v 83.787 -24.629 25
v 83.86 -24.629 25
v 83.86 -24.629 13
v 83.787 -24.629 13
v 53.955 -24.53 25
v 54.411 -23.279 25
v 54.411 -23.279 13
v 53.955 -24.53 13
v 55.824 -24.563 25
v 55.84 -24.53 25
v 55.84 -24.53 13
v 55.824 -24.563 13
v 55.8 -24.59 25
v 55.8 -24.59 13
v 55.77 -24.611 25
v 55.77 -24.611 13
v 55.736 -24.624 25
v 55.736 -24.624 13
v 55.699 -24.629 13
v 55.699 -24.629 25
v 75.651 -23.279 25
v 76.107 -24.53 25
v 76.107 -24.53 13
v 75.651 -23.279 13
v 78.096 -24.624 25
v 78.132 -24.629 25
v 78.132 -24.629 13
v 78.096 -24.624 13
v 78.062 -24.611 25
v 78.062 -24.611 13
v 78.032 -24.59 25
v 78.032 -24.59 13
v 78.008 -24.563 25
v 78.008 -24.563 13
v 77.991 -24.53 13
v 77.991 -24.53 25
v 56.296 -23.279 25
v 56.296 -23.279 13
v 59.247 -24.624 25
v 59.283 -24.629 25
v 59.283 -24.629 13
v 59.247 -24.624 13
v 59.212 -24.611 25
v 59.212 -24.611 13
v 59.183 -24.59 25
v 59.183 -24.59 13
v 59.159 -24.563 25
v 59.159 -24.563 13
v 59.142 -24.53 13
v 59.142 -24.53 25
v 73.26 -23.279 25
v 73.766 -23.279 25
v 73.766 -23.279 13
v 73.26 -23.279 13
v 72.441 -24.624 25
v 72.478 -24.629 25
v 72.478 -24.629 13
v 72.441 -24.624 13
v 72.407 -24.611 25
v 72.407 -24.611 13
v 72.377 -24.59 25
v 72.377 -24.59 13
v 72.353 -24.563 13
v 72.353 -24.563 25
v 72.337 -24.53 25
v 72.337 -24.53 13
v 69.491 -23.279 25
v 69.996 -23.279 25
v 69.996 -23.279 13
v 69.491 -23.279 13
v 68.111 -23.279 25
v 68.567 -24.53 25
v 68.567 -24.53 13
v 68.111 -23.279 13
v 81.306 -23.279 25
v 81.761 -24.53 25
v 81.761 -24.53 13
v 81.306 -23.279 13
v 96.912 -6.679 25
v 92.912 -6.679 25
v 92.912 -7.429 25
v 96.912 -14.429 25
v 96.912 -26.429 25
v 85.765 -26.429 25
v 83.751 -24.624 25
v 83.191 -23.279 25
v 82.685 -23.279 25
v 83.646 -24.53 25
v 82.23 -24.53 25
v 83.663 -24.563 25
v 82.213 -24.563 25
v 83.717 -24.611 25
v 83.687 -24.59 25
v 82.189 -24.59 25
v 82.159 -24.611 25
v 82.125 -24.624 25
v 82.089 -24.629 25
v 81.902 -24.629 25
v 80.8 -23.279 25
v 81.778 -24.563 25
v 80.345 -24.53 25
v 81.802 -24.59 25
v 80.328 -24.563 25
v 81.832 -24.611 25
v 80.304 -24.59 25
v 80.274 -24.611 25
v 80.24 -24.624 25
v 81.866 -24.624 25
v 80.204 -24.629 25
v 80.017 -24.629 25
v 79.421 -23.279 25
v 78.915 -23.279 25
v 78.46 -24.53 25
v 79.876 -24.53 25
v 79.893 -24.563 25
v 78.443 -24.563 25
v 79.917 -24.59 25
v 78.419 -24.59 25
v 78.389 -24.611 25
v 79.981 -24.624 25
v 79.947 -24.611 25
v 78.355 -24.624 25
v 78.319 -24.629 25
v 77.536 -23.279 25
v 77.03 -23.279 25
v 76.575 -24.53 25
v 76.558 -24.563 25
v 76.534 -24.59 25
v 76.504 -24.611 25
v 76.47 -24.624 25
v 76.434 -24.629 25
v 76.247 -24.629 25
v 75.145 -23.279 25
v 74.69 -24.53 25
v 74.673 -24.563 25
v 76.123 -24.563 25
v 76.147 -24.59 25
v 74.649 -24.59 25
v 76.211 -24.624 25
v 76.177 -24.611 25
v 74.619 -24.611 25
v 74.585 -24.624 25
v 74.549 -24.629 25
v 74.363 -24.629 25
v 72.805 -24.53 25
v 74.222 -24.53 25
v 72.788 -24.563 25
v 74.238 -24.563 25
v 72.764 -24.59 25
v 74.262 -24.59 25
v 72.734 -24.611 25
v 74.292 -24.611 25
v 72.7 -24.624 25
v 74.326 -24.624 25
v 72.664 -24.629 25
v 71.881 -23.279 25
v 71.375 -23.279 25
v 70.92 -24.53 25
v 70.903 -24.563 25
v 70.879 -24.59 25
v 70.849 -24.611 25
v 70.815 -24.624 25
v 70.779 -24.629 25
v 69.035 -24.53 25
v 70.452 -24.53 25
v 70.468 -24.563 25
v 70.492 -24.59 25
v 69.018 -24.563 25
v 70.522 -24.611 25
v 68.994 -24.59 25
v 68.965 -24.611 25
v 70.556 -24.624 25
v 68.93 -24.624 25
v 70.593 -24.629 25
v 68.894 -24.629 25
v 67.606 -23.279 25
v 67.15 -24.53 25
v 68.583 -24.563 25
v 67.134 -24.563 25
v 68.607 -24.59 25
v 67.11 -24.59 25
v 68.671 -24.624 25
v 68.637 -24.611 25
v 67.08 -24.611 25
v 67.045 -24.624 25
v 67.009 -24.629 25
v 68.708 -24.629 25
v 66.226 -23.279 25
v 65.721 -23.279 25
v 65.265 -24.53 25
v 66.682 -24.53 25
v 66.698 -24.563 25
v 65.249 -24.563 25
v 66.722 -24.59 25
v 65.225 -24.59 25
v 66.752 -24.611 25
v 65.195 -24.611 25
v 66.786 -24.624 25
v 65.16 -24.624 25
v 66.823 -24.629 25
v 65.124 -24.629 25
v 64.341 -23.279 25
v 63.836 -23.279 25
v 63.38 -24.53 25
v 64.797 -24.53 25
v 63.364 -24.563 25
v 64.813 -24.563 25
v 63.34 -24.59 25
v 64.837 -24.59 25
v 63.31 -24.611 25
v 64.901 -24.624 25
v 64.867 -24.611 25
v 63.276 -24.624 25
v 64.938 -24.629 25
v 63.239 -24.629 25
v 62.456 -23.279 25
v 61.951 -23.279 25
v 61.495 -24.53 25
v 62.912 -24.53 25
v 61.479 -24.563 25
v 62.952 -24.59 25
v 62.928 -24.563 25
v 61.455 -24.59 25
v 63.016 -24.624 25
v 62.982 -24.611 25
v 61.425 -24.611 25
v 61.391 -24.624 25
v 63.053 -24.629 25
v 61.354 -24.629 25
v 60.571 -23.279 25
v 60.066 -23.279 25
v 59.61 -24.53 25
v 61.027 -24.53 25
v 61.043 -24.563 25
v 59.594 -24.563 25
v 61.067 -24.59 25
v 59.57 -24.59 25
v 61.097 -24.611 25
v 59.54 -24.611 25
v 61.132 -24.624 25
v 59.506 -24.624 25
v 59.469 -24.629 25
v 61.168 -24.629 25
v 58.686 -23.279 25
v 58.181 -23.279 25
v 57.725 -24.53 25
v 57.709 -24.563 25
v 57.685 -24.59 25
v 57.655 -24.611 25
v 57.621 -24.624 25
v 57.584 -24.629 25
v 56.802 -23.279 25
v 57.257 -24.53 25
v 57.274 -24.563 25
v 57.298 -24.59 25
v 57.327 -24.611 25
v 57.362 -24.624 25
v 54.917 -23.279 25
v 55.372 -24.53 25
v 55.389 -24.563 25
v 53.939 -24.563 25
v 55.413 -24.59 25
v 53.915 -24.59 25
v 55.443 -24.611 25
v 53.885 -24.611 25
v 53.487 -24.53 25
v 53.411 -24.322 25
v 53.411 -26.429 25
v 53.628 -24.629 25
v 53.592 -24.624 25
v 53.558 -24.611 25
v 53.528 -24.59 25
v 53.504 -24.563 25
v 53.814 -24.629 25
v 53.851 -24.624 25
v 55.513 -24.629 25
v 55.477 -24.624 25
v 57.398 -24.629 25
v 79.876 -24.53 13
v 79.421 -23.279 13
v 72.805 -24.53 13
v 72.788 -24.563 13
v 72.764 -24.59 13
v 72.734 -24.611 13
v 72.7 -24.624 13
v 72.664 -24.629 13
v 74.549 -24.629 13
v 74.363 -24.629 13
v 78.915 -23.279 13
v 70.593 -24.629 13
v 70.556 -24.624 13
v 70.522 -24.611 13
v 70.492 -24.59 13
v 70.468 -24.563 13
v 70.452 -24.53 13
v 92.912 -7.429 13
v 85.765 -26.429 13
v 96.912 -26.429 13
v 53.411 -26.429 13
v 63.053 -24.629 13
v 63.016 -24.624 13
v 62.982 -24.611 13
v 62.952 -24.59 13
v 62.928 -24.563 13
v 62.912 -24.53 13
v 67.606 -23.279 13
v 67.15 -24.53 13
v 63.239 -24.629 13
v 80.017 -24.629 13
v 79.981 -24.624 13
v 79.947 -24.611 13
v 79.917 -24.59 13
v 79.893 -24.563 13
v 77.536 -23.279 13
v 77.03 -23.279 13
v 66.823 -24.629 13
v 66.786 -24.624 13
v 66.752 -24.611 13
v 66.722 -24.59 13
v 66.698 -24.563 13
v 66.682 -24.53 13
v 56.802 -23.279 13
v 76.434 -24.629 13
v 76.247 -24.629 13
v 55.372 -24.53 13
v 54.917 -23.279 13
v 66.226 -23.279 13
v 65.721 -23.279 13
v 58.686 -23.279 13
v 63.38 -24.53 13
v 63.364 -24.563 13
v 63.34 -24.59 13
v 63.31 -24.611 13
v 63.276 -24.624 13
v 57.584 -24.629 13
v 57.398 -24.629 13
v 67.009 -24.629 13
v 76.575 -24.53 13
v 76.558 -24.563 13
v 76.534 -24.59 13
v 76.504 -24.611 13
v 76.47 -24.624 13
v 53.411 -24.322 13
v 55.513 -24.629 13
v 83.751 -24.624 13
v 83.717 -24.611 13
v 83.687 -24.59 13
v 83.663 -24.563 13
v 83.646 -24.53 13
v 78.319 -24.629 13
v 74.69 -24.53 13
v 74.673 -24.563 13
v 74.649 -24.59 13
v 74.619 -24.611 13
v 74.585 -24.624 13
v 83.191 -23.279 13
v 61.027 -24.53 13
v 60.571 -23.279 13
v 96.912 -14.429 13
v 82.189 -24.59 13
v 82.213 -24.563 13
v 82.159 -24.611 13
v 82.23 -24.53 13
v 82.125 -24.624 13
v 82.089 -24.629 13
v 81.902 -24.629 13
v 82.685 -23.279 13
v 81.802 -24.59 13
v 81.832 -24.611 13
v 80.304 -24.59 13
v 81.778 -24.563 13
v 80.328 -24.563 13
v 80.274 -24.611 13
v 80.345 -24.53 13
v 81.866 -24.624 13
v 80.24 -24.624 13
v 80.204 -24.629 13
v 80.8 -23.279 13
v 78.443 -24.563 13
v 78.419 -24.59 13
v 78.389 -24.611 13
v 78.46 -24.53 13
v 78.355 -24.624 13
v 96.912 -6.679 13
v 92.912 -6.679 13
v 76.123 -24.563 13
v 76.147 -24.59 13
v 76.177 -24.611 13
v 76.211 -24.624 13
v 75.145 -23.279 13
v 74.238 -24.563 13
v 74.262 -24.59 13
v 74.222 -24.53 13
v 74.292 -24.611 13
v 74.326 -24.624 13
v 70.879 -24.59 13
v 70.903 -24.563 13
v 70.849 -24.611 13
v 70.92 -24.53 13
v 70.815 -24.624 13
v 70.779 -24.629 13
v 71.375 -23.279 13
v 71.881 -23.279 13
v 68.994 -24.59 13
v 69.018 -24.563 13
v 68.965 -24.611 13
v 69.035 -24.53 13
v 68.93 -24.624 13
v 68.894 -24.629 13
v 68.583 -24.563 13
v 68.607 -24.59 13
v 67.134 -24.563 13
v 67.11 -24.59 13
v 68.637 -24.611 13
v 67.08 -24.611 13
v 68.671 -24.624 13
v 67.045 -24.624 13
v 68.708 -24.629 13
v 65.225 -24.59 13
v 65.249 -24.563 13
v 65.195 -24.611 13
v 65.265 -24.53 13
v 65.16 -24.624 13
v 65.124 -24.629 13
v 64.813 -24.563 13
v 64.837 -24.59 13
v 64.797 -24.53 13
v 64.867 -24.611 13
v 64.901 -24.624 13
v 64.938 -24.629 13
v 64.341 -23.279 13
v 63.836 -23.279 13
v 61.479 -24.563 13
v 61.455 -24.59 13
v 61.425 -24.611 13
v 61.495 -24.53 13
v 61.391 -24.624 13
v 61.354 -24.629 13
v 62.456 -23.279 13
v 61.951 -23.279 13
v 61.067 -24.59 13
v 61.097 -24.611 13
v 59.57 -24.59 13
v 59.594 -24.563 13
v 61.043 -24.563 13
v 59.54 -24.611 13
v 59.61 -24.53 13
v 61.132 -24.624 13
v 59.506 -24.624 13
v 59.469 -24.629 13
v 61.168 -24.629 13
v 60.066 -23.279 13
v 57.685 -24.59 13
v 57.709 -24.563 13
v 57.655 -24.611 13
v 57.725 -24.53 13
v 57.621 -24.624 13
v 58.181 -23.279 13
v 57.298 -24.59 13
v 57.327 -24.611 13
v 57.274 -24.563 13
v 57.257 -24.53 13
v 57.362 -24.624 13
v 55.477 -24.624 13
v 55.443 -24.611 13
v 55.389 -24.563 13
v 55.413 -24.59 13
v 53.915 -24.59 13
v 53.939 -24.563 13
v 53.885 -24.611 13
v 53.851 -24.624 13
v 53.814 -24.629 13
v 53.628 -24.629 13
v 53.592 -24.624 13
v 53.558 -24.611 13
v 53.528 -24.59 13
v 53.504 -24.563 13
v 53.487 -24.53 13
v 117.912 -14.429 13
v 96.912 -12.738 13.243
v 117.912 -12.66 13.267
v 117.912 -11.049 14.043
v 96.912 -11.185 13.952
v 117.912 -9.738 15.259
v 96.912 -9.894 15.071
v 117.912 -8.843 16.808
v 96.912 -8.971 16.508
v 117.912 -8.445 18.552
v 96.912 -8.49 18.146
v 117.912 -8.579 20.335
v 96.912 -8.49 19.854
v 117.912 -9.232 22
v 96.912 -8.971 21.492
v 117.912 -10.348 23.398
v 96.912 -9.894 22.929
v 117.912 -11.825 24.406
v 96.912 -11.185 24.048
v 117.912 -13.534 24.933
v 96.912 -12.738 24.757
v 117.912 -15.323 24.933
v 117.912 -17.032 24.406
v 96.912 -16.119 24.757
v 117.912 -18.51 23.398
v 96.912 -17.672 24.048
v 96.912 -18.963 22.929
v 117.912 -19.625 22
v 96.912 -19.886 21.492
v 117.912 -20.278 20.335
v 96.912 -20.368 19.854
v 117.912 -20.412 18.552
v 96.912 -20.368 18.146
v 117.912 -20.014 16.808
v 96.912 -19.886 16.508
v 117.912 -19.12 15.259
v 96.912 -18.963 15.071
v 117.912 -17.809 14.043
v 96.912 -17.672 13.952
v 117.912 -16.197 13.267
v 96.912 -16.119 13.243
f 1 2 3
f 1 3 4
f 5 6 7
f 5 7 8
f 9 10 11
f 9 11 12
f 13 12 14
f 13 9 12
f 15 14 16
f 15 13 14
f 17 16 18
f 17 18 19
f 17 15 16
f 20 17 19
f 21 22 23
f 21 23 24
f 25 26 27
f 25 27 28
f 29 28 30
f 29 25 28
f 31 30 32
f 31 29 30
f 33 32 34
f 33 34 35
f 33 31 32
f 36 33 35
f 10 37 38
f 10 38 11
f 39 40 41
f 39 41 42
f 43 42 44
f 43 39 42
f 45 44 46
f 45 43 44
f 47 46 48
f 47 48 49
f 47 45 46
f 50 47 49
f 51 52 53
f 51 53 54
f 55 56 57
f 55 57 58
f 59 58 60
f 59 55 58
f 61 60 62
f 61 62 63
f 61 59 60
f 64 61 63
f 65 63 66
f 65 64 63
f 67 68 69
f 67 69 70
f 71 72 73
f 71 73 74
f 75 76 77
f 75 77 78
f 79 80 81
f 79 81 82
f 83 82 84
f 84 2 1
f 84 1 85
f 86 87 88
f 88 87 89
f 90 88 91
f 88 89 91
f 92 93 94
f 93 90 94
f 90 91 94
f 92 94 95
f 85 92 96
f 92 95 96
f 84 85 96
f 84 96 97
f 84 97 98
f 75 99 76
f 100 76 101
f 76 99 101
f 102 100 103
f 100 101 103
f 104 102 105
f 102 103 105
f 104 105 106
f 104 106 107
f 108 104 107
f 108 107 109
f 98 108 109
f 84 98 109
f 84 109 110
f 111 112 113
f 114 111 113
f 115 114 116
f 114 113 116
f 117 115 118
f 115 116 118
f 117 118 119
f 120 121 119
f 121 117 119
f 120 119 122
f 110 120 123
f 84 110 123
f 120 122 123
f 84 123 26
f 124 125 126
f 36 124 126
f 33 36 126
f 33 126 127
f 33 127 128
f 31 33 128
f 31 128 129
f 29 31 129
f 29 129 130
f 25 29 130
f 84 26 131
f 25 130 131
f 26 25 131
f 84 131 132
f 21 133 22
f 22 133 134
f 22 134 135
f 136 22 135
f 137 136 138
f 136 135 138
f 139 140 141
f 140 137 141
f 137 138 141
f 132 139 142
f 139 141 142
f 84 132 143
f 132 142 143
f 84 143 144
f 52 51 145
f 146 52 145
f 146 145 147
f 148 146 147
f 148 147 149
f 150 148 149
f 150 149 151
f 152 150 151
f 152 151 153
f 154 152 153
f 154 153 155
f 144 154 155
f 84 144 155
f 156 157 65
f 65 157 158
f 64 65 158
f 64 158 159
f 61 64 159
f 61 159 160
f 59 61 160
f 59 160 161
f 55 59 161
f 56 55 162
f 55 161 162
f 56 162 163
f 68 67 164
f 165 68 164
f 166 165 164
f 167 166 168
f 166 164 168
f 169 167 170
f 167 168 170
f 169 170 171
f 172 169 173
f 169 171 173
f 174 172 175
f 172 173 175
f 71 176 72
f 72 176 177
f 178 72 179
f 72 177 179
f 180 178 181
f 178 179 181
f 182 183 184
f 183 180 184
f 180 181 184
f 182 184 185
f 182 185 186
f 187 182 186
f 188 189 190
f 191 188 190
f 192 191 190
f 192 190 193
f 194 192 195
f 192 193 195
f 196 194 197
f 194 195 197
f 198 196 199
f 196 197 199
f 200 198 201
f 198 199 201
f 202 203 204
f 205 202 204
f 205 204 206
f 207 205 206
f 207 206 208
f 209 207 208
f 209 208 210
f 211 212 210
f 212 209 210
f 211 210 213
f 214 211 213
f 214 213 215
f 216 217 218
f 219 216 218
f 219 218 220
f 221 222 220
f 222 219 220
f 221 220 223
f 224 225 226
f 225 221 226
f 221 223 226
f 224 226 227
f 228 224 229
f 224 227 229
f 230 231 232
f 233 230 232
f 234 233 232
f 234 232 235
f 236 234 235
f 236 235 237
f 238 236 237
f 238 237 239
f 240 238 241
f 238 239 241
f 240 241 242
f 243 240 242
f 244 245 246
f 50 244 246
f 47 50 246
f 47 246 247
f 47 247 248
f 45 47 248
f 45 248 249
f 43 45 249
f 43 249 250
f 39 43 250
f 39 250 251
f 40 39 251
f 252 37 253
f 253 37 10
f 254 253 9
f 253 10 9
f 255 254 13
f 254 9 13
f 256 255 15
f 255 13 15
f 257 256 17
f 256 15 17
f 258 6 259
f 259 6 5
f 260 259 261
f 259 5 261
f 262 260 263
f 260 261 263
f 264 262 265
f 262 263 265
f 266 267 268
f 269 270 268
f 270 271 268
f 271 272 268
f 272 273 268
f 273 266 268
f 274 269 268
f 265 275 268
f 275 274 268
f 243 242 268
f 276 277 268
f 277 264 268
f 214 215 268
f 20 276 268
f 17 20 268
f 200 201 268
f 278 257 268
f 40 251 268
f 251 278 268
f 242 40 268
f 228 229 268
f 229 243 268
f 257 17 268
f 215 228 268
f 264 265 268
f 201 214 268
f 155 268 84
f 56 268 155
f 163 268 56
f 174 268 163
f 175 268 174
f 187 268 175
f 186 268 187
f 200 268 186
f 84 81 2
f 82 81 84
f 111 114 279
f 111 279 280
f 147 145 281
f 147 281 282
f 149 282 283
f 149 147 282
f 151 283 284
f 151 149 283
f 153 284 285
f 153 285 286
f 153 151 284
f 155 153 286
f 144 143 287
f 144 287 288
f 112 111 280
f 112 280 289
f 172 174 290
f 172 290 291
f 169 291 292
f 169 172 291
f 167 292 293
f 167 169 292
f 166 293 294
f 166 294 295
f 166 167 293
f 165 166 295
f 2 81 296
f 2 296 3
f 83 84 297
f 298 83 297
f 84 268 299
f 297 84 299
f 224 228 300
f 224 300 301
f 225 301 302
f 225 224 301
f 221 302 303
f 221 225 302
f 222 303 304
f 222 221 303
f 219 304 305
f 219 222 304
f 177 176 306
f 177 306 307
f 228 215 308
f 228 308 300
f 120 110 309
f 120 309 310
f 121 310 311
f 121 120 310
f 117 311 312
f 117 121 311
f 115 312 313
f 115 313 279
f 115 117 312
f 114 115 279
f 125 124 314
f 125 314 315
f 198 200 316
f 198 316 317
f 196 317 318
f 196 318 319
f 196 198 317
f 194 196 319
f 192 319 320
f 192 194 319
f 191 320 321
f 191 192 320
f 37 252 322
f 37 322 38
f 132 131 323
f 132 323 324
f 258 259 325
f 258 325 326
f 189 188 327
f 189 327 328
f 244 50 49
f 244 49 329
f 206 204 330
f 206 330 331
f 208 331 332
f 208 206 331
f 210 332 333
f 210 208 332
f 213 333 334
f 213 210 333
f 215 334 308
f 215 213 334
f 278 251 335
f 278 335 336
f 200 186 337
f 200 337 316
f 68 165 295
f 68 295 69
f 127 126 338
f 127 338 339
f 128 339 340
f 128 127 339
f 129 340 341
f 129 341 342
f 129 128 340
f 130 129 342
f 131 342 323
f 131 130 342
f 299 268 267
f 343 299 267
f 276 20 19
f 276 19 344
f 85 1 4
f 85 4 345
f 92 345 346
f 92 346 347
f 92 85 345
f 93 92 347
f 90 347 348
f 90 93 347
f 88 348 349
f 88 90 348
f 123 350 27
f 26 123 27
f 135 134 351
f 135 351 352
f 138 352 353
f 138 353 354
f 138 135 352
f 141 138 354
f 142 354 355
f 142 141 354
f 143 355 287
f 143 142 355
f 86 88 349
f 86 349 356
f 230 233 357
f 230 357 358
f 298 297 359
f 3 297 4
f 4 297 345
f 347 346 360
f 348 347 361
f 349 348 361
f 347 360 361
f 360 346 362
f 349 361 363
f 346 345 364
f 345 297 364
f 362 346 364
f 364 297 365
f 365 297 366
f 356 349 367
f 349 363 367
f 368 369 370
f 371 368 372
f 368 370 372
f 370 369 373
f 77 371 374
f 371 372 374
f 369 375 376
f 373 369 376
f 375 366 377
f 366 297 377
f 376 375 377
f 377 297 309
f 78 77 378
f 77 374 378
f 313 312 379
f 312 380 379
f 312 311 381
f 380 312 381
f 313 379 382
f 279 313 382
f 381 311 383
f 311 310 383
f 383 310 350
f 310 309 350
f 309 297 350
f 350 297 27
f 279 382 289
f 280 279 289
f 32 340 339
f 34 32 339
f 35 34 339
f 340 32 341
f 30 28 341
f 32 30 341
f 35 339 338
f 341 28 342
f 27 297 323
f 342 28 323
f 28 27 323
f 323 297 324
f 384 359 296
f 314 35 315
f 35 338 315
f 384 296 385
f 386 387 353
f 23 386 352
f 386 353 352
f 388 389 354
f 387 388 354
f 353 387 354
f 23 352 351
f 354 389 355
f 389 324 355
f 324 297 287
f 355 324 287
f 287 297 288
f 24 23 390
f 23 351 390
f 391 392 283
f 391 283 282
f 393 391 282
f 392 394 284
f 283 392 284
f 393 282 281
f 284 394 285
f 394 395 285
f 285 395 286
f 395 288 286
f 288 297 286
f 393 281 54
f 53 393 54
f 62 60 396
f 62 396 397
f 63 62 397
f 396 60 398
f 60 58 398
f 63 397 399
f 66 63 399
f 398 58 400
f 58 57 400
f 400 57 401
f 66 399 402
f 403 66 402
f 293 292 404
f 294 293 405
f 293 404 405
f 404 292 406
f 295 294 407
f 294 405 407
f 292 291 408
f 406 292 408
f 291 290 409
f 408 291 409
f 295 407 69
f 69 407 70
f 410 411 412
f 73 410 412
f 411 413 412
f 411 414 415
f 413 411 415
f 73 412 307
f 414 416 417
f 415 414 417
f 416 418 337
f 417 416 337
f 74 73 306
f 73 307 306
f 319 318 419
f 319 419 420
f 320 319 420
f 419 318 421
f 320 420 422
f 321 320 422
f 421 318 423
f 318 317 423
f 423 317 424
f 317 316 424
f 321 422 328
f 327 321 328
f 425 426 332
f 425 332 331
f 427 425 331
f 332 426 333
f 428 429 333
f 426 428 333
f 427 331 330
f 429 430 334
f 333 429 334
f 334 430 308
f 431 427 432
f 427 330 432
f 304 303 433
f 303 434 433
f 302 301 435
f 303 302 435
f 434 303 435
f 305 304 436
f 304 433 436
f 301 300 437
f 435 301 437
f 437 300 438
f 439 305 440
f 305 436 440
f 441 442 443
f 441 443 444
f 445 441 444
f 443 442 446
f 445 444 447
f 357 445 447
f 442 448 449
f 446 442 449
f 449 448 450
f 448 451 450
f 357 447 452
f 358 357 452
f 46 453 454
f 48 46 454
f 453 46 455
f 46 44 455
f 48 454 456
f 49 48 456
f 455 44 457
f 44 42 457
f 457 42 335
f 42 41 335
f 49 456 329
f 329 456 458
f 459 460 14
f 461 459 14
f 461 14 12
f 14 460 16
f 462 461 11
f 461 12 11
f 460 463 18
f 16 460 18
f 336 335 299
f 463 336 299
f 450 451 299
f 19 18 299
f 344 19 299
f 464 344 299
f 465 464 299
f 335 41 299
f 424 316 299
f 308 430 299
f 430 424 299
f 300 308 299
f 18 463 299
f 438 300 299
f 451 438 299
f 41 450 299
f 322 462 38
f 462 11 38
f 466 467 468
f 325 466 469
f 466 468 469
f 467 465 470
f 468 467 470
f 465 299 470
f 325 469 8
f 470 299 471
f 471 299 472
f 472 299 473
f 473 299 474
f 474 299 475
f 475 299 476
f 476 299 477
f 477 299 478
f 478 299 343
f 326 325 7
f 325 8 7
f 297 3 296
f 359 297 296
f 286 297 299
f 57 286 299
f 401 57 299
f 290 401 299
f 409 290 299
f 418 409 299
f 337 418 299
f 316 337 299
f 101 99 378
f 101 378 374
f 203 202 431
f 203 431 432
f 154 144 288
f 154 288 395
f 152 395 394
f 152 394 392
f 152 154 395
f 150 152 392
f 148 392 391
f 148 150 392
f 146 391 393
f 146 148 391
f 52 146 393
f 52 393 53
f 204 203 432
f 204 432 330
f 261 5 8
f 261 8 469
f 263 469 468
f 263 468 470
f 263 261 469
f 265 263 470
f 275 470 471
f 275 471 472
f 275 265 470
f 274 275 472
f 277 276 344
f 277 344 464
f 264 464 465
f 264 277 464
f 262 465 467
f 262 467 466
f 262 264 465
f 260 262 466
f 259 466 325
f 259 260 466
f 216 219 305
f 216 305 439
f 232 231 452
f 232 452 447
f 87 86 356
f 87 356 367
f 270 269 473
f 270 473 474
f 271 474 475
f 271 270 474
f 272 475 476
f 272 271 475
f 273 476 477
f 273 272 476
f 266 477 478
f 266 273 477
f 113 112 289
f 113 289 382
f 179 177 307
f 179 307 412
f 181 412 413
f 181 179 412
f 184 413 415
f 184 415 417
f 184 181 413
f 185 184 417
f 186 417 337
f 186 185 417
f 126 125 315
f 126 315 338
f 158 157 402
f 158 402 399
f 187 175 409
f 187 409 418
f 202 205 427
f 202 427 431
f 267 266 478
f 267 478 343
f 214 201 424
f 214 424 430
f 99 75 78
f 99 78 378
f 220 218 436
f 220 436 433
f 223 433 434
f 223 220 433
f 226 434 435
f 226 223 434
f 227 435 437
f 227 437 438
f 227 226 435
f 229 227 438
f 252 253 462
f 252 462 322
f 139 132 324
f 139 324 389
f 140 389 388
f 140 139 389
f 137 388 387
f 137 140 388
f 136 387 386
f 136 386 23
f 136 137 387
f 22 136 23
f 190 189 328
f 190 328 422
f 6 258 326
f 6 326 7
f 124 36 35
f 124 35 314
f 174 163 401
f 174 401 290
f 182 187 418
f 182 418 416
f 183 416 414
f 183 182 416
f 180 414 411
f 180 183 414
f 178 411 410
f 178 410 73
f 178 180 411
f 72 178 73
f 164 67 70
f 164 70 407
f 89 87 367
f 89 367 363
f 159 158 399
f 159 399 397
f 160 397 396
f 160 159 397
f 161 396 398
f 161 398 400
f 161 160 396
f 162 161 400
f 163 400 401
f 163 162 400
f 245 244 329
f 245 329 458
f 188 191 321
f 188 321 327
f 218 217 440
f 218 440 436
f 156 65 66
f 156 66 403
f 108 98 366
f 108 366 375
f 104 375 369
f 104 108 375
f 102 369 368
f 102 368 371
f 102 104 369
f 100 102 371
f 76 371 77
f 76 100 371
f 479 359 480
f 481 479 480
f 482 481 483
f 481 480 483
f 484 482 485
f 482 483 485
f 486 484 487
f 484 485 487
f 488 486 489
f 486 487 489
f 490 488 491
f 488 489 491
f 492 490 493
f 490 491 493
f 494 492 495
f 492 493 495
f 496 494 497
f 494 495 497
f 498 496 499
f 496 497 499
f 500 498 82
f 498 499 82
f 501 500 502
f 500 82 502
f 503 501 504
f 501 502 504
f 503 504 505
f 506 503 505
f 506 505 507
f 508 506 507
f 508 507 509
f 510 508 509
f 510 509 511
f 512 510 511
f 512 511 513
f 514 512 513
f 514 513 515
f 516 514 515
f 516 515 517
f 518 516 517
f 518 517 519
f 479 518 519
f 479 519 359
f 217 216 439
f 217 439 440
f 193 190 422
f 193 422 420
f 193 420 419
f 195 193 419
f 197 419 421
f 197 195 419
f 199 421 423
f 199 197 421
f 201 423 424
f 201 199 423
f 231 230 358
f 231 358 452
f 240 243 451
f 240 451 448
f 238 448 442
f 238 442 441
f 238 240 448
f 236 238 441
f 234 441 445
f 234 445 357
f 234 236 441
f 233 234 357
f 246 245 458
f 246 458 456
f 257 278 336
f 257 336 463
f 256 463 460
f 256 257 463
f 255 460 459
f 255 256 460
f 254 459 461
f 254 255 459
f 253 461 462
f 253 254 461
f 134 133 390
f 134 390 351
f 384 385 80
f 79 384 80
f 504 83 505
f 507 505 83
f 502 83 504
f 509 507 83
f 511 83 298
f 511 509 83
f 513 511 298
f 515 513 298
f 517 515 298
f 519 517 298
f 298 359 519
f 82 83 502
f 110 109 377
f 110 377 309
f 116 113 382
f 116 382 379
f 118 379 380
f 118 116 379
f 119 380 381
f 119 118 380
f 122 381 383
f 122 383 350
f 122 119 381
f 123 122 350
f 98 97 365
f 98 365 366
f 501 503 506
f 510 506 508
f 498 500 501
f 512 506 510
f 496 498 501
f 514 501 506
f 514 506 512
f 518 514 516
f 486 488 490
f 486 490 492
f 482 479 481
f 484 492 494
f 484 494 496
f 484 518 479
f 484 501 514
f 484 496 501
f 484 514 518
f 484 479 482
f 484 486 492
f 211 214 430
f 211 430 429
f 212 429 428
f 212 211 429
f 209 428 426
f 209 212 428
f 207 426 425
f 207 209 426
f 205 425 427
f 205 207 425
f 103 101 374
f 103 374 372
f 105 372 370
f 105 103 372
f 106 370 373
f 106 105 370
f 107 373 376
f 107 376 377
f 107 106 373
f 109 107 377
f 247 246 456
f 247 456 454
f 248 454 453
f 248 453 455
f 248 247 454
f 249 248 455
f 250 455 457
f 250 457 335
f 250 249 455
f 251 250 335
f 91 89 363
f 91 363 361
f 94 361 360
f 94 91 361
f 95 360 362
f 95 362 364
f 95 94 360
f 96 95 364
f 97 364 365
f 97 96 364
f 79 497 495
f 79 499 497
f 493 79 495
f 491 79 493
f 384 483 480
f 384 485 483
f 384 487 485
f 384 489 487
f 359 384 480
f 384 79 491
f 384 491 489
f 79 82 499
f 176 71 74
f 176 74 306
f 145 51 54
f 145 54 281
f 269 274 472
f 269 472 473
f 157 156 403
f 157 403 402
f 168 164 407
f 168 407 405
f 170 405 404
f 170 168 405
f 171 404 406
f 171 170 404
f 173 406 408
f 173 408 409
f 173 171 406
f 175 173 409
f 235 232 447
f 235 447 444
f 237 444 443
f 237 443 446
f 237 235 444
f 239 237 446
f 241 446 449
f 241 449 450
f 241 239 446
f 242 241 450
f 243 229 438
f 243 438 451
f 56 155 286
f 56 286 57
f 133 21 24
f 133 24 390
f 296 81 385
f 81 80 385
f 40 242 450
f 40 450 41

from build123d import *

# Parameters (mm, degrees)
BOSS_EXTRUDE1_DEPTH = 20
SCALE1_SCALE        = 0.3
BOSS_EXTRUDE5_DEPTH = 12
BOSS_EXTRUDE2_DEPTH = 4
SKETCH5_R           = 6
BOSS_EXTRUDE3_DEPTH = 21
SKETCH10_W          = 7.23
SKETCH10_H          = 3.15
CUT_EXTRUDE1_DEPTH  = 12


with BuildPart() as part:
    # Sketch1 → Boss-Extrude1 (new, symmetric)
    with BuildSketch(Plane.XY.offset(19)):
        with BuildLine():
            Line((0, -23.5), (0, -29.5))
            Line((0, -29.5), (131.946891451, -29.5))
            Line((131.946891451, -29.5), (131.946891451, -23.5))
            Line((131.946891451, -23.5), (131.636124479, -23.5))
            ThreePointArc((131.636124479, -23.5), (131.349336261, -23.409576022), (131.166278168, -23.171010072))
            Line((131.166278168, -23.171010072), (129.648154655, -19))
            Line((129.648154655, -19), (127.962442939, -19))
            Line((127.962442939, -19), (126.444319426, -23.171010072))
            ThreePointArc((126.444319426, -23.171010072), (126.261261334, -23.409576022), (125.974473116, -23.5))
            Line((125.974473116, -23.5), (125.352939172, -23.5))
            ThreePointArc((125.352939172, -23.5), (125.066150953, -23.409576022), (124.883092861, -23.171010072))
            Line((124.883092861, -23.171010072), (123.364969348, -19))
            Line((123.364969348, -19), (121.679257632, -19))
            Line((121.679257632, -19), (120.161134119, -23.171010072))
            ThreePointArc((120.161134119, -23.171010072), (119.978076027, -23.409576022), (119.691287808, -23.5))
            Line((119.691287808, -23.5), (119.069753864, -23.5))
            ThreePointArc((119.069753864, -23.5), (118.782965646, -23.409576022), (118.599907554, -23.171010072))
            Line((118.599907554, -23.171010072), (117.081784041, -19))
            Line((117.081784041, -19), (115.396072325, -19))
            Line((115.396072325, -19), (113.877948812, -23.171010072))
            ThreePointArc((113.877948812, -23.171010072), (113.694890719, -23.409576022), (113.408102501, -23.5))
            Line((113.408102501, -23.5), (112.786568557, -23.5))
            ThreePointArc((112.786568557, -23.5), (112.499780339, -23.409576022), (112.316722247, -23.171010072))
            Line((112.316722247, -23.171010072), (110.798598734, -19))
            Line((110.798598734, -19), (109.112887017, -19))
            Line((109.112887017, -19), (107.594763504, -23.171010072))
            ThreePointArc((107.594763504, -23.171010072), (107.411705412, -23.409576022), (107.124917194, -23.5))
            Line((107.124917194, -23.5), (106.50338325, -23.5))
            ThreePointArc((106.50338325, -23.5), (106.216595032, -23.409576022), (106.03353694, -23.171010072))
            Line((106.03353694, -23.171010072), (104.515413427, -19))
            Line((104.515413427, -19), (102.82970171, -19))
            Line((102.82970171, -19), (101.311578197, -23.171010072))
            ThreePointArc((101.311578197, -23.171010072), (101.128520105, -23.409576022), (100.841731887, -23.5))
            Line((100.841731887, -23.5), (100.220197943, -23.5))
            ThreePointArc((100.220197943, -23.5), (99.933409725, -23.409576022), (99.750351632, -23.171010072))
            Line((99.750351632, -23.171010072), (98.23222812, -19))
            Line((98.23222812, -19), (96.546516403, -19))
            Line((96.546516403, -19), (95.02839289, -23.171010072))
            ThreePointArc((95.02839289, -23.171010072), (94.845334798, -23.409576022), (94.55854658, -23.5))
            Line((94.55854658, -23.5), (93.937012636, -23.5))
            ThreePointArc((93.937012636, -23.5), (93.650224417, -23.409576022), (93.467166325, -23.171010072))
            Line((93.467166325, -23.171010072), (91.949042812, -19))
            Line((91.949042812, -19), (90.263331096, -19))
            Line((90.263331096, -19), (88.745207583, -23.171010072))
            ThreePointArc((88.745207583, -23.171010072), (88.562149491, -23.409576022), (88.275361273, -23.5))
            Line((88.275361273, -23.5), (87.653827328, -23.5))
            ThreePointArc((87.653827328, -23.5), (87.36703911, -23.409576022), (87.183981018, -23.171010072))
            Line((87.183981018, -23.171010072), (85.665857505, -19))
            Line((85.665857505, -19), (83.980145789, -19))
            Line((83.980145789, -19), (82.462022276, -23.171010072))
            ThreePointArc((82.462022276, -23.171010072), (82.278964184, -23.409576022), (81.992175965, -23.5))
            Line((81.992175965, -23.5), (81.370642021, -23.5))
            ThreePointArc((81.370642021, -23.5), (81.083853803, -23.409576022), (80.900795711, -23.171010072))
            Line((80.900795711, -23.171010072), (79.382672198, -19))
            Line((79.382672198, -19), (77.696960481, -19))
            Line((77.696960481, -19), (76.178836969, -23.171010072))
            ThreePointArc((76.178836969, -23.171010072), (75.995778876, -23.409576022), (75.708990658, -23.5))
            Line((75.708990658, -23.5), (75.087456714, -23.5))
            ThreePointArc((75.087456714, -23.5), (74.800668496, -23.409576022), (74.617610404, -23.171010072))
            Line((74.617610404, -23.171010072), (73.099486891, -19))
            Line((73.099486891, -19), (71.413775174, -19))
            Line((71.413775174, -19), (69.895651661, -23.171010072))
            ThreePointArc((69.895651661, -23.171010072), (69.712593569, -23.409576022), (69.425805351, -23.5))
            Line((69.425805351, -23.5), (68.804271407, -23.5))
            ThreePointArc((68.804271407, -23.5), (68.517483189, -23.409576022), (68.334425097, -23.171010072))
            Line((68.334425097, -23.171010072), (66.816301584, -19))
            Line((66.816301584, -19), (65.130589867, -19))
            Line((65.130589867, -19), (63.612466354, -23.171010072))
            ThreePointArc((63.612466354, -23.171010072), (63.429408262, -23.409576022), (63.142620044, -23.5))
            Line((63.142620044, -23.5), (62.5210861, -23.5))
            ThreePointArc((62.5210861, -23.5), (62.234297882, -23.409576022), (62.051239789, -23.171010072))
            Line((62.051239789, -23.171010072), (60.533116276, -19))
            Line((60.533116276, -19), (58.84740456, -19))
            Line((58.84740456, -19), (57.329281047, -23.171010072))
            ThreePointArc((57.329281047, -23.171010072), (57.146222955, -23.409576022), (56.859434737, -23.5))
            Line((56.859434737, -23.5), (56.237900793, -23.5))
            ThreePointArc((56.237900793, -23.5), (55.951112574, -23.409576022), (55.768054482, -23.171010072))
            Line((55.768054482, -23.171010072), (54.249930969, -19))
            Line((54.249930969, -19), (52.564219253, -19))
            Line((52.564219253, -19), (51.04609574, -23.171010072))
            ThreePointArc((51.04609574, -23.171010072), (50.863037648, -23.409576022), (50.576249429, -23.5))
            Line((50.576249429, -23.5), (49.954715485, -23.5))
            ThreePointArc((49.954715485, -23.5), (49.667927267, -23.409576022), (49.484869175, -23.171010072))
            Line((49.484869175, -23.171010072), (47.966745662, -19))
            Line((47.966745662, -19), (46.281033946, -19))
            Line((46.281033946, -19), (44.762910433, -23.171010072))
            ThreePointArc((44.762910433, -23.171010072), (44.57985234, -23.409576022), (44.293064122, -23.5))
            Line((44.293064122, -23.5), (43.671530178, -23.5))
            ThreePointArc((43.671530178, -23.5), (43.38474196, -23.409576022), (43.201683868, -23.171010072))
            Line((43.201683868, -23.171010072), (41.683560355, -19))
            Line((41.683560355, -19), (39.997848638, -19))
            Line((39.997848638, -19), (38.479725125, -23.171010072))
            ThreePointArc((38.479725125, -23.171010072), (38.296667033, -23.409576022), (38.009878815, -23.5))
            Line((38.009878815, -23.5), (37.388344871, -23.5))
            ThreePointArc((37.388344871, -23.5), (37.101556653, -23.409576022), (36.918498561, -23.171010072))
            Line((36.918498561, -23.171010072), (35.400375048, -19))
            Line((35.400375048, -19), (33.714663331, -19))
            Line((33.714663331, -19), (32.196539818, -23.171010072))
            ThreePointArc((32.196539818, -23.171010072), (32.013481726, -23.409576022), (31.726693508, -23.5))
            Line((31.726693508, -23.5), (31.105159564, -23.5))
            ThreePointArc((31.105159564, -23.5), (30.818371346, -23.409576022), (30.635313253, -23.171010072))
            Line((30.635313253, -23.171010072), (29.117189741, -19))
            Line((29.117189741, -19), (27.431478024, -19))
            Line((27.431478024, -19), (25.913354511, -23.171010072))
            ThreePointArc((25.913354511, -23.171010072), (25.730296419, -23.409576022), (25.443508201, -23.5))
            Line((25.443508201, -23.5), (24.821974257, -23.5))
            ThreePointArc((24.821974257, -23.5), (24.535186039, -23.409576022), (24.352127946, -23.171010072))
            Line((24.352127946, -23.171010072), (22.834004433, -19))
            Line((22.834004433, -19), (21.148292717, -19))
            Line((21.148292717, -19), (19.630169204, -23.171010072))
            ThreePointArc((19.630169204, -23.171010072), (19.447111112, -23.409576022), (19.160322894, -23.5))
            Line((19.160322894, -23.5), (18.53878895, -23.5))
            ThreePointArc((18.53878895, -23.5), (18.252000731, -23.409576022), (18.068942639, -23.171010072))
            Line((18.068942639, -23.171010072), (16.550819126, -19))
            Line((16.550819126, -19), (14.86510741, -19))
            Line((14.86510741, -19), (13.346983897, -23.171010072))
            ThreePointArc((13.346983897, -23.171010072), (13.163925805, -23.409576022), (12.877137586, -23.5))
            Line((12.877137586, -23.5), (12.255603642, -23.5))
            ThreePointArc((12.255603642, -23.5), (11.968815424, -23.409576022), (11.785757332, -23.171010072))
            Line((11.785757332, -23.171010072), (10.267633819, -19))
            Line((10.267633819, -19), (8.581922103, -19))
            Line((8.581922103, -19), (7.06379859, -23.171010072))
            ThreePointArc((7.06379859, -23.171010072), (6.880740497, -23.409576022), (6.593952279, -23.5))
            Line((6.593952279, -23.5), (5.972418335, -23.5))
            ThreePointArc((5.972418335, -23.5), (5.685630117, -23.409576022), (5.502572025, -23.171010072))
            Line((5.502572025, -23.171010072), (3.984448512, -19))
            Line((3.984448512, -19), (2.298736795, -19))
            Line((2.298736795, -19), (0.780613282, -23.171010072))
            ThreePointArc((0.780613282, -23.171010072), (0.59755519, -23.409576022), (0.310766972, -23.5))
            Line((0.310766972, -23.5), (0, -23.5))
        make_face()
    extrude(amount=BOSS_EXTRUDE1_DEPTH, both=True)


with BuildPart() as part_1:
    # Scale1: scaled about (65.973445725, -25.112352152, 19)
    add(part.part.scale(SCALE1_SCALE).moved(Location((46.181412008, -17.578646506, 13.3))))

    # Sketch8 → Boss-Extrude5 (add)
    with BuildSketch(Plane.XY.offset(25)):
        Polygon((82.912250153, -26.428646507), (92.912250153, -26.428646507), (92.912250153, -7.428646507), align=None)
    extrude(amount=-BOSS_EXTRUDE5_DEPTH)

    # Sketch4 → Boss-Extrude2 (add)
    with BuildSketch(Plane(origin=(92.912250153, 0, 0), x_dir=(0, 0, -1), z_dir=(1, 0, 0))):
        Polygon((-13, -26.428646507), (-13, -14.428646507), (-13, -6.678646507), (-25, -6.678646507), (-25, -14.428646507), (-25, -26.428646507), align=None)
    extrude(amount=BOSS_EXTRUDE2_DEPTH)

    # Sketch5 → Boss-Extrude3 (add)
    with BuildSketch(Plane(origin=(96.912250153, 0, 0), x_dir=(0, 0, -1), z_dir=(1, 0, 0))):
        with Locations((-19, -14.428646507)):
            Circle(SKETCH5_R)
    extrude(amount=BOSS_EXTRUDE3_DEPTH)

    # Sketch10 → Cut-Extrude1 (cut)
    with BuildSketch(Plane.XY.offset(25)):
        with Locations((49.796412008, -24.853646507)):
            Rectangle(SKETCH10_W, SKETCH10_H)
    extrude(amount=-CUT_EXTRUDE1_DEPTH, mode=Mode.SUBTRACT)


solid = part_1.part
